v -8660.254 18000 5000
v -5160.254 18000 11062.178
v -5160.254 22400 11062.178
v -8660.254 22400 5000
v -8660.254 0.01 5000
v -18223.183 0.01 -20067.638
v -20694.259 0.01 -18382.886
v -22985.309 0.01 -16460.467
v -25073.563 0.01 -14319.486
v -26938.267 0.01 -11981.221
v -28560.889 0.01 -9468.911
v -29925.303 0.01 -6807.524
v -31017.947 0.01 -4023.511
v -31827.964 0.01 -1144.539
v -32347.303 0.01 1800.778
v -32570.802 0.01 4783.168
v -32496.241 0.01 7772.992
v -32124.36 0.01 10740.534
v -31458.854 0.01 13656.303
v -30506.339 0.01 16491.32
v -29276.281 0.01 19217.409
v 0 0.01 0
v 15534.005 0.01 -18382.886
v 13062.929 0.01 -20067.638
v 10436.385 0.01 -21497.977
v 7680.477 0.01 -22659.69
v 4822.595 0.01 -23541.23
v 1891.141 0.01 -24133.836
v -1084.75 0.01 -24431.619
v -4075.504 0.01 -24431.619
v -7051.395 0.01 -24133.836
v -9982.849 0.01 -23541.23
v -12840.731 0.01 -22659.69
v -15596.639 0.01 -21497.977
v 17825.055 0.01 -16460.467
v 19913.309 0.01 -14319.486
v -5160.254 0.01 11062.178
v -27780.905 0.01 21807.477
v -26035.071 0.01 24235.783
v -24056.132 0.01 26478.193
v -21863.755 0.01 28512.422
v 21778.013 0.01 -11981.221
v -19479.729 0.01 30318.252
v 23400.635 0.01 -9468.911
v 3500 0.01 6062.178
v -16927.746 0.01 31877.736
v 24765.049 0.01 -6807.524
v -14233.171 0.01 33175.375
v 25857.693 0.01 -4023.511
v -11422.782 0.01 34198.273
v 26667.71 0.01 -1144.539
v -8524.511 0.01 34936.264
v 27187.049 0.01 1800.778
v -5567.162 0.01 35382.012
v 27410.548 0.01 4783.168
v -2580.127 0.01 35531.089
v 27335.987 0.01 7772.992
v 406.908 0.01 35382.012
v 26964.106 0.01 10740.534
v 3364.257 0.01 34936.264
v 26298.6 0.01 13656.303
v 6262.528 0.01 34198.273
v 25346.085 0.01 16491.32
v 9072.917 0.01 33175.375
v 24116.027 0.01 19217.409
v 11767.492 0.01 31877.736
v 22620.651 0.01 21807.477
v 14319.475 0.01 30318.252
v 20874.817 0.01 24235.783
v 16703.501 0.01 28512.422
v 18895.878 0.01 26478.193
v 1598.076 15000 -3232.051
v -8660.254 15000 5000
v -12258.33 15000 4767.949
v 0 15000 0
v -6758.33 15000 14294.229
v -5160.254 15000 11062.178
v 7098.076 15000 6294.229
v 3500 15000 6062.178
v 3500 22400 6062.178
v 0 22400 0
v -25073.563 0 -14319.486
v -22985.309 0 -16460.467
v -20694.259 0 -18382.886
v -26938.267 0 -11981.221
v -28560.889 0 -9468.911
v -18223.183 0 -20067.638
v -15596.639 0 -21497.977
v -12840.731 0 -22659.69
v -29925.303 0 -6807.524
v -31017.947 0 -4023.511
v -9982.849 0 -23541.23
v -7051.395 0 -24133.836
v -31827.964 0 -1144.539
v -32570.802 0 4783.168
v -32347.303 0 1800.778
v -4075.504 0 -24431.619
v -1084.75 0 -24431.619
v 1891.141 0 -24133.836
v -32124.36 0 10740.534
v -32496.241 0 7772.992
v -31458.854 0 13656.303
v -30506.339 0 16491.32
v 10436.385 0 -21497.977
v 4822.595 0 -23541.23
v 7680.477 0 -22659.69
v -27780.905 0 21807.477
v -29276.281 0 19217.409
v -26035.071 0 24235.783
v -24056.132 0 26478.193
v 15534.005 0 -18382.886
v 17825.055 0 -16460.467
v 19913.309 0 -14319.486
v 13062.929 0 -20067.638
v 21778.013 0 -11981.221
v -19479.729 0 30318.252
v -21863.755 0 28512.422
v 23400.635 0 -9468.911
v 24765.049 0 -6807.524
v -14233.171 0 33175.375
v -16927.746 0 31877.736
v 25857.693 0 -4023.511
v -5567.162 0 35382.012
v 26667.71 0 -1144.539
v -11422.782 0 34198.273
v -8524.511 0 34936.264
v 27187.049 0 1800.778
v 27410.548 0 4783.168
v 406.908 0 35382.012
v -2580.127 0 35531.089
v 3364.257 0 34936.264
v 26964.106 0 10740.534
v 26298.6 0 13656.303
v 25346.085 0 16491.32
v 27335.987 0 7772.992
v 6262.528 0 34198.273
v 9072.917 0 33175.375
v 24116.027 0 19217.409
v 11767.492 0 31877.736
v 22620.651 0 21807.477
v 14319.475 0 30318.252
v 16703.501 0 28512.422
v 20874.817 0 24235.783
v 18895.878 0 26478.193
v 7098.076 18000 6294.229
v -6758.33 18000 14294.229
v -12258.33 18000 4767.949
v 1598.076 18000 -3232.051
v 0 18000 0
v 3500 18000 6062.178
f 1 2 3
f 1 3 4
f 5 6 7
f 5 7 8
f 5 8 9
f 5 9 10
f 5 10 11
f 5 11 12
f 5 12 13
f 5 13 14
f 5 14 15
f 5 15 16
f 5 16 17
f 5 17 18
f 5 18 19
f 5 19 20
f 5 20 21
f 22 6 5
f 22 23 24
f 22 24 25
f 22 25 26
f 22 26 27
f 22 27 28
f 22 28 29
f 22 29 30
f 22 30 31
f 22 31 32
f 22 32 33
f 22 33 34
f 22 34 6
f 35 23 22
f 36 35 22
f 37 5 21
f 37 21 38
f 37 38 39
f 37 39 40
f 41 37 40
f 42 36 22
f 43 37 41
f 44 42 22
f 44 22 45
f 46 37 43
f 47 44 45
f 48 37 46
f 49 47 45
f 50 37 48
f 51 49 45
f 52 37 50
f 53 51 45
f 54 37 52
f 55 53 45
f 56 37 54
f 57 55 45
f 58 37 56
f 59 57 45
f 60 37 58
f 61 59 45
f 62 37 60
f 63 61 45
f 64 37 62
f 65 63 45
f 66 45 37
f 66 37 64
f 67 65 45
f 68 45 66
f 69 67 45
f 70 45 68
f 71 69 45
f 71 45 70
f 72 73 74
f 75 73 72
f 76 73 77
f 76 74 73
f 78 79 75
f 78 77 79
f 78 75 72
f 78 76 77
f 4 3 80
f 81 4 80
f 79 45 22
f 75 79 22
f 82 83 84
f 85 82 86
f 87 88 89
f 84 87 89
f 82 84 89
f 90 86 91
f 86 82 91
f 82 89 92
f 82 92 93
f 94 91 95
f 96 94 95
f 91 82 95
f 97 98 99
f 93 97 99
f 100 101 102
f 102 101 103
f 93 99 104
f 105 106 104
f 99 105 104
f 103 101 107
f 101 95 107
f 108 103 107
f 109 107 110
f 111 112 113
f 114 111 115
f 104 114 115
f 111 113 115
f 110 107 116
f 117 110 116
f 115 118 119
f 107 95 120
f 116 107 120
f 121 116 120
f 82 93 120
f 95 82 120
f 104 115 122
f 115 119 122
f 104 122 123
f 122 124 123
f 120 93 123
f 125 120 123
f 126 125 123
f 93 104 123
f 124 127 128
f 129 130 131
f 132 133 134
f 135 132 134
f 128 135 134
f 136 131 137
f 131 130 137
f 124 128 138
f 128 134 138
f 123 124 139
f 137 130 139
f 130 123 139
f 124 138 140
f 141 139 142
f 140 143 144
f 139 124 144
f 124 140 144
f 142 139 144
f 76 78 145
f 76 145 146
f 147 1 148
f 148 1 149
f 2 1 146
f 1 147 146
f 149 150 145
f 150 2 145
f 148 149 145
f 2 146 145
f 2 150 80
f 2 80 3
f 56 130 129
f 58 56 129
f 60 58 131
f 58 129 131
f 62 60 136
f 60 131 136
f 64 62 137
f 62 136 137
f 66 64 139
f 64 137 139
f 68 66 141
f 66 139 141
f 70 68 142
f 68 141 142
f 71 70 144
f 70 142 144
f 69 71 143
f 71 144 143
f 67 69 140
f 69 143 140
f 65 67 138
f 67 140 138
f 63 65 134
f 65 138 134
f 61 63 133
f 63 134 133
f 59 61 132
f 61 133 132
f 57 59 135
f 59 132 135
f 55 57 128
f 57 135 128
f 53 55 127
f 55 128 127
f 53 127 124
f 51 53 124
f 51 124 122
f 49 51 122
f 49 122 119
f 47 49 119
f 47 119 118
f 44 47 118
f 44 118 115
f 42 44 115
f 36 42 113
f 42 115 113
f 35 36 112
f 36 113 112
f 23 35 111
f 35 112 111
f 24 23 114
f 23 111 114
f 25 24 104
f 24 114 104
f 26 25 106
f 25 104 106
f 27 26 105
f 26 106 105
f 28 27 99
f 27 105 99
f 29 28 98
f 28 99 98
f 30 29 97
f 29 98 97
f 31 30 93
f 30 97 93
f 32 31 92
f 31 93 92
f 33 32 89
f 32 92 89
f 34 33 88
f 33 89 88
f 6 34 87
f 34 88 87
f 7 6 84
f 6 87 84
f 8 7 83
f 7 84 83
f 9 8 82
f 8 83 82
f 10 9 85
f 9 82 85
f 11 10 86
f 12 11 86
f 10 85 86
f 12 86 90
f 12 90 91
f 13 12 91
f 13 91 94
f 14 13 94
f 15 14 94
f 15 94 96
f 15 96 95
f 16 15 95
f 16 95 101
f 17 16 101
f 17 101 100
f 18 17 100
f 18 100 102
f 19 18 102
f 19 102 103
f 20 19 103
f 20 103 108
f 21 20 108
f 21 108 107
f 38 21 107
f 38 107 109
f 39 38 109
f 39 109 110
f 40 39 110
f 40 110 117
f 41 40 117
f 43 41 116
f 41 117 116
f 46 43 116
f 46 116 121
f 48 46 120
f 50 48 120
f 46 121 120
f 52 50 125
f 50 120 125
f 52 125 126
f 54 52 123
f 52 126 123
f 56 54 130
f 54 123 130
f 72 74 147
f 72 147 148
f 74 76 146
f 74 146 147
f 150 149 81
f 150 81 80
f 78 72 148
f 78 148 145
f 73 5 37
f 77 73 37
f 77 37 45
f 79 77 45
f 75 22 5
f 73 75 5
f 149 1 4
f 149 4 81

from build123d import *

# Parameters (mm, degrees)
EXTRUDE1_DEPTH = 15000
EXTRUDE2_DEPTH = 3000
EXTRUDE3_DEPTH = 4400
SKETCH4_R      = 30000
EXTRUDE4_DEPTH = 0.01


with BuildPart() as part:
    # Sketch1 → Extrude1 (new body)
    with BuildSketch(Plane(origin=(0, 0, 0), x_dir=(1, 0, 0), z_dir=(0, 1, 0))):
        Polygon((0, 0), (-8660.254037844, -5000), (-5160.254037844, -11062.177826491), (3500, -6062.177826491), align=None)
    extrude(amount=EXTRUDE1_DEPTH)

    # Sketch2 → Extrude2 (add)
    with BuildSketch(Plane(origin=(0, 15000, 0), x_dir=(-1, 0, 0), z_dir=(0, 1, 0))):
        Polygon((12258.330249198, 4767.949192431), (-1598.076211353, -3232.050807569), (-7098.076211353, 6294.22863406), (6758.330249198, 14294.22863406), align=None)
    extrude(amount=EXTRUDE2_DEPTH)

    # Sketch3 → Extrude3 (add)
    with BuildSketch(Plane(origin=(0, 18000, 0), x_dir=(-1, 0, 0), z_dir=(0, 1, 0))):
        Polygon((0, 0), (-3500, 6062.177826491), (5160.254037844, 11062.177826491), (8660.254037844, 5000), align=None)
    extrude(amount=EXTRUDE3_DEPTH)

    # Sketch4 → Extrude4 (add)
    with BuildSketch(Plane(origin=(0, 0, 0), x_dir=(1, 0, 0), z_dir=(0, 1, 0))):
        with Locations(Location((-2580.127018922, -5531.088913246, 0), (0, 0, 270))):  # turned: the seam where the file's is
            Circle(SKETCH4_R)
    extrude(amount=EXTRUDE4_DEPTH)


solid = part.part
